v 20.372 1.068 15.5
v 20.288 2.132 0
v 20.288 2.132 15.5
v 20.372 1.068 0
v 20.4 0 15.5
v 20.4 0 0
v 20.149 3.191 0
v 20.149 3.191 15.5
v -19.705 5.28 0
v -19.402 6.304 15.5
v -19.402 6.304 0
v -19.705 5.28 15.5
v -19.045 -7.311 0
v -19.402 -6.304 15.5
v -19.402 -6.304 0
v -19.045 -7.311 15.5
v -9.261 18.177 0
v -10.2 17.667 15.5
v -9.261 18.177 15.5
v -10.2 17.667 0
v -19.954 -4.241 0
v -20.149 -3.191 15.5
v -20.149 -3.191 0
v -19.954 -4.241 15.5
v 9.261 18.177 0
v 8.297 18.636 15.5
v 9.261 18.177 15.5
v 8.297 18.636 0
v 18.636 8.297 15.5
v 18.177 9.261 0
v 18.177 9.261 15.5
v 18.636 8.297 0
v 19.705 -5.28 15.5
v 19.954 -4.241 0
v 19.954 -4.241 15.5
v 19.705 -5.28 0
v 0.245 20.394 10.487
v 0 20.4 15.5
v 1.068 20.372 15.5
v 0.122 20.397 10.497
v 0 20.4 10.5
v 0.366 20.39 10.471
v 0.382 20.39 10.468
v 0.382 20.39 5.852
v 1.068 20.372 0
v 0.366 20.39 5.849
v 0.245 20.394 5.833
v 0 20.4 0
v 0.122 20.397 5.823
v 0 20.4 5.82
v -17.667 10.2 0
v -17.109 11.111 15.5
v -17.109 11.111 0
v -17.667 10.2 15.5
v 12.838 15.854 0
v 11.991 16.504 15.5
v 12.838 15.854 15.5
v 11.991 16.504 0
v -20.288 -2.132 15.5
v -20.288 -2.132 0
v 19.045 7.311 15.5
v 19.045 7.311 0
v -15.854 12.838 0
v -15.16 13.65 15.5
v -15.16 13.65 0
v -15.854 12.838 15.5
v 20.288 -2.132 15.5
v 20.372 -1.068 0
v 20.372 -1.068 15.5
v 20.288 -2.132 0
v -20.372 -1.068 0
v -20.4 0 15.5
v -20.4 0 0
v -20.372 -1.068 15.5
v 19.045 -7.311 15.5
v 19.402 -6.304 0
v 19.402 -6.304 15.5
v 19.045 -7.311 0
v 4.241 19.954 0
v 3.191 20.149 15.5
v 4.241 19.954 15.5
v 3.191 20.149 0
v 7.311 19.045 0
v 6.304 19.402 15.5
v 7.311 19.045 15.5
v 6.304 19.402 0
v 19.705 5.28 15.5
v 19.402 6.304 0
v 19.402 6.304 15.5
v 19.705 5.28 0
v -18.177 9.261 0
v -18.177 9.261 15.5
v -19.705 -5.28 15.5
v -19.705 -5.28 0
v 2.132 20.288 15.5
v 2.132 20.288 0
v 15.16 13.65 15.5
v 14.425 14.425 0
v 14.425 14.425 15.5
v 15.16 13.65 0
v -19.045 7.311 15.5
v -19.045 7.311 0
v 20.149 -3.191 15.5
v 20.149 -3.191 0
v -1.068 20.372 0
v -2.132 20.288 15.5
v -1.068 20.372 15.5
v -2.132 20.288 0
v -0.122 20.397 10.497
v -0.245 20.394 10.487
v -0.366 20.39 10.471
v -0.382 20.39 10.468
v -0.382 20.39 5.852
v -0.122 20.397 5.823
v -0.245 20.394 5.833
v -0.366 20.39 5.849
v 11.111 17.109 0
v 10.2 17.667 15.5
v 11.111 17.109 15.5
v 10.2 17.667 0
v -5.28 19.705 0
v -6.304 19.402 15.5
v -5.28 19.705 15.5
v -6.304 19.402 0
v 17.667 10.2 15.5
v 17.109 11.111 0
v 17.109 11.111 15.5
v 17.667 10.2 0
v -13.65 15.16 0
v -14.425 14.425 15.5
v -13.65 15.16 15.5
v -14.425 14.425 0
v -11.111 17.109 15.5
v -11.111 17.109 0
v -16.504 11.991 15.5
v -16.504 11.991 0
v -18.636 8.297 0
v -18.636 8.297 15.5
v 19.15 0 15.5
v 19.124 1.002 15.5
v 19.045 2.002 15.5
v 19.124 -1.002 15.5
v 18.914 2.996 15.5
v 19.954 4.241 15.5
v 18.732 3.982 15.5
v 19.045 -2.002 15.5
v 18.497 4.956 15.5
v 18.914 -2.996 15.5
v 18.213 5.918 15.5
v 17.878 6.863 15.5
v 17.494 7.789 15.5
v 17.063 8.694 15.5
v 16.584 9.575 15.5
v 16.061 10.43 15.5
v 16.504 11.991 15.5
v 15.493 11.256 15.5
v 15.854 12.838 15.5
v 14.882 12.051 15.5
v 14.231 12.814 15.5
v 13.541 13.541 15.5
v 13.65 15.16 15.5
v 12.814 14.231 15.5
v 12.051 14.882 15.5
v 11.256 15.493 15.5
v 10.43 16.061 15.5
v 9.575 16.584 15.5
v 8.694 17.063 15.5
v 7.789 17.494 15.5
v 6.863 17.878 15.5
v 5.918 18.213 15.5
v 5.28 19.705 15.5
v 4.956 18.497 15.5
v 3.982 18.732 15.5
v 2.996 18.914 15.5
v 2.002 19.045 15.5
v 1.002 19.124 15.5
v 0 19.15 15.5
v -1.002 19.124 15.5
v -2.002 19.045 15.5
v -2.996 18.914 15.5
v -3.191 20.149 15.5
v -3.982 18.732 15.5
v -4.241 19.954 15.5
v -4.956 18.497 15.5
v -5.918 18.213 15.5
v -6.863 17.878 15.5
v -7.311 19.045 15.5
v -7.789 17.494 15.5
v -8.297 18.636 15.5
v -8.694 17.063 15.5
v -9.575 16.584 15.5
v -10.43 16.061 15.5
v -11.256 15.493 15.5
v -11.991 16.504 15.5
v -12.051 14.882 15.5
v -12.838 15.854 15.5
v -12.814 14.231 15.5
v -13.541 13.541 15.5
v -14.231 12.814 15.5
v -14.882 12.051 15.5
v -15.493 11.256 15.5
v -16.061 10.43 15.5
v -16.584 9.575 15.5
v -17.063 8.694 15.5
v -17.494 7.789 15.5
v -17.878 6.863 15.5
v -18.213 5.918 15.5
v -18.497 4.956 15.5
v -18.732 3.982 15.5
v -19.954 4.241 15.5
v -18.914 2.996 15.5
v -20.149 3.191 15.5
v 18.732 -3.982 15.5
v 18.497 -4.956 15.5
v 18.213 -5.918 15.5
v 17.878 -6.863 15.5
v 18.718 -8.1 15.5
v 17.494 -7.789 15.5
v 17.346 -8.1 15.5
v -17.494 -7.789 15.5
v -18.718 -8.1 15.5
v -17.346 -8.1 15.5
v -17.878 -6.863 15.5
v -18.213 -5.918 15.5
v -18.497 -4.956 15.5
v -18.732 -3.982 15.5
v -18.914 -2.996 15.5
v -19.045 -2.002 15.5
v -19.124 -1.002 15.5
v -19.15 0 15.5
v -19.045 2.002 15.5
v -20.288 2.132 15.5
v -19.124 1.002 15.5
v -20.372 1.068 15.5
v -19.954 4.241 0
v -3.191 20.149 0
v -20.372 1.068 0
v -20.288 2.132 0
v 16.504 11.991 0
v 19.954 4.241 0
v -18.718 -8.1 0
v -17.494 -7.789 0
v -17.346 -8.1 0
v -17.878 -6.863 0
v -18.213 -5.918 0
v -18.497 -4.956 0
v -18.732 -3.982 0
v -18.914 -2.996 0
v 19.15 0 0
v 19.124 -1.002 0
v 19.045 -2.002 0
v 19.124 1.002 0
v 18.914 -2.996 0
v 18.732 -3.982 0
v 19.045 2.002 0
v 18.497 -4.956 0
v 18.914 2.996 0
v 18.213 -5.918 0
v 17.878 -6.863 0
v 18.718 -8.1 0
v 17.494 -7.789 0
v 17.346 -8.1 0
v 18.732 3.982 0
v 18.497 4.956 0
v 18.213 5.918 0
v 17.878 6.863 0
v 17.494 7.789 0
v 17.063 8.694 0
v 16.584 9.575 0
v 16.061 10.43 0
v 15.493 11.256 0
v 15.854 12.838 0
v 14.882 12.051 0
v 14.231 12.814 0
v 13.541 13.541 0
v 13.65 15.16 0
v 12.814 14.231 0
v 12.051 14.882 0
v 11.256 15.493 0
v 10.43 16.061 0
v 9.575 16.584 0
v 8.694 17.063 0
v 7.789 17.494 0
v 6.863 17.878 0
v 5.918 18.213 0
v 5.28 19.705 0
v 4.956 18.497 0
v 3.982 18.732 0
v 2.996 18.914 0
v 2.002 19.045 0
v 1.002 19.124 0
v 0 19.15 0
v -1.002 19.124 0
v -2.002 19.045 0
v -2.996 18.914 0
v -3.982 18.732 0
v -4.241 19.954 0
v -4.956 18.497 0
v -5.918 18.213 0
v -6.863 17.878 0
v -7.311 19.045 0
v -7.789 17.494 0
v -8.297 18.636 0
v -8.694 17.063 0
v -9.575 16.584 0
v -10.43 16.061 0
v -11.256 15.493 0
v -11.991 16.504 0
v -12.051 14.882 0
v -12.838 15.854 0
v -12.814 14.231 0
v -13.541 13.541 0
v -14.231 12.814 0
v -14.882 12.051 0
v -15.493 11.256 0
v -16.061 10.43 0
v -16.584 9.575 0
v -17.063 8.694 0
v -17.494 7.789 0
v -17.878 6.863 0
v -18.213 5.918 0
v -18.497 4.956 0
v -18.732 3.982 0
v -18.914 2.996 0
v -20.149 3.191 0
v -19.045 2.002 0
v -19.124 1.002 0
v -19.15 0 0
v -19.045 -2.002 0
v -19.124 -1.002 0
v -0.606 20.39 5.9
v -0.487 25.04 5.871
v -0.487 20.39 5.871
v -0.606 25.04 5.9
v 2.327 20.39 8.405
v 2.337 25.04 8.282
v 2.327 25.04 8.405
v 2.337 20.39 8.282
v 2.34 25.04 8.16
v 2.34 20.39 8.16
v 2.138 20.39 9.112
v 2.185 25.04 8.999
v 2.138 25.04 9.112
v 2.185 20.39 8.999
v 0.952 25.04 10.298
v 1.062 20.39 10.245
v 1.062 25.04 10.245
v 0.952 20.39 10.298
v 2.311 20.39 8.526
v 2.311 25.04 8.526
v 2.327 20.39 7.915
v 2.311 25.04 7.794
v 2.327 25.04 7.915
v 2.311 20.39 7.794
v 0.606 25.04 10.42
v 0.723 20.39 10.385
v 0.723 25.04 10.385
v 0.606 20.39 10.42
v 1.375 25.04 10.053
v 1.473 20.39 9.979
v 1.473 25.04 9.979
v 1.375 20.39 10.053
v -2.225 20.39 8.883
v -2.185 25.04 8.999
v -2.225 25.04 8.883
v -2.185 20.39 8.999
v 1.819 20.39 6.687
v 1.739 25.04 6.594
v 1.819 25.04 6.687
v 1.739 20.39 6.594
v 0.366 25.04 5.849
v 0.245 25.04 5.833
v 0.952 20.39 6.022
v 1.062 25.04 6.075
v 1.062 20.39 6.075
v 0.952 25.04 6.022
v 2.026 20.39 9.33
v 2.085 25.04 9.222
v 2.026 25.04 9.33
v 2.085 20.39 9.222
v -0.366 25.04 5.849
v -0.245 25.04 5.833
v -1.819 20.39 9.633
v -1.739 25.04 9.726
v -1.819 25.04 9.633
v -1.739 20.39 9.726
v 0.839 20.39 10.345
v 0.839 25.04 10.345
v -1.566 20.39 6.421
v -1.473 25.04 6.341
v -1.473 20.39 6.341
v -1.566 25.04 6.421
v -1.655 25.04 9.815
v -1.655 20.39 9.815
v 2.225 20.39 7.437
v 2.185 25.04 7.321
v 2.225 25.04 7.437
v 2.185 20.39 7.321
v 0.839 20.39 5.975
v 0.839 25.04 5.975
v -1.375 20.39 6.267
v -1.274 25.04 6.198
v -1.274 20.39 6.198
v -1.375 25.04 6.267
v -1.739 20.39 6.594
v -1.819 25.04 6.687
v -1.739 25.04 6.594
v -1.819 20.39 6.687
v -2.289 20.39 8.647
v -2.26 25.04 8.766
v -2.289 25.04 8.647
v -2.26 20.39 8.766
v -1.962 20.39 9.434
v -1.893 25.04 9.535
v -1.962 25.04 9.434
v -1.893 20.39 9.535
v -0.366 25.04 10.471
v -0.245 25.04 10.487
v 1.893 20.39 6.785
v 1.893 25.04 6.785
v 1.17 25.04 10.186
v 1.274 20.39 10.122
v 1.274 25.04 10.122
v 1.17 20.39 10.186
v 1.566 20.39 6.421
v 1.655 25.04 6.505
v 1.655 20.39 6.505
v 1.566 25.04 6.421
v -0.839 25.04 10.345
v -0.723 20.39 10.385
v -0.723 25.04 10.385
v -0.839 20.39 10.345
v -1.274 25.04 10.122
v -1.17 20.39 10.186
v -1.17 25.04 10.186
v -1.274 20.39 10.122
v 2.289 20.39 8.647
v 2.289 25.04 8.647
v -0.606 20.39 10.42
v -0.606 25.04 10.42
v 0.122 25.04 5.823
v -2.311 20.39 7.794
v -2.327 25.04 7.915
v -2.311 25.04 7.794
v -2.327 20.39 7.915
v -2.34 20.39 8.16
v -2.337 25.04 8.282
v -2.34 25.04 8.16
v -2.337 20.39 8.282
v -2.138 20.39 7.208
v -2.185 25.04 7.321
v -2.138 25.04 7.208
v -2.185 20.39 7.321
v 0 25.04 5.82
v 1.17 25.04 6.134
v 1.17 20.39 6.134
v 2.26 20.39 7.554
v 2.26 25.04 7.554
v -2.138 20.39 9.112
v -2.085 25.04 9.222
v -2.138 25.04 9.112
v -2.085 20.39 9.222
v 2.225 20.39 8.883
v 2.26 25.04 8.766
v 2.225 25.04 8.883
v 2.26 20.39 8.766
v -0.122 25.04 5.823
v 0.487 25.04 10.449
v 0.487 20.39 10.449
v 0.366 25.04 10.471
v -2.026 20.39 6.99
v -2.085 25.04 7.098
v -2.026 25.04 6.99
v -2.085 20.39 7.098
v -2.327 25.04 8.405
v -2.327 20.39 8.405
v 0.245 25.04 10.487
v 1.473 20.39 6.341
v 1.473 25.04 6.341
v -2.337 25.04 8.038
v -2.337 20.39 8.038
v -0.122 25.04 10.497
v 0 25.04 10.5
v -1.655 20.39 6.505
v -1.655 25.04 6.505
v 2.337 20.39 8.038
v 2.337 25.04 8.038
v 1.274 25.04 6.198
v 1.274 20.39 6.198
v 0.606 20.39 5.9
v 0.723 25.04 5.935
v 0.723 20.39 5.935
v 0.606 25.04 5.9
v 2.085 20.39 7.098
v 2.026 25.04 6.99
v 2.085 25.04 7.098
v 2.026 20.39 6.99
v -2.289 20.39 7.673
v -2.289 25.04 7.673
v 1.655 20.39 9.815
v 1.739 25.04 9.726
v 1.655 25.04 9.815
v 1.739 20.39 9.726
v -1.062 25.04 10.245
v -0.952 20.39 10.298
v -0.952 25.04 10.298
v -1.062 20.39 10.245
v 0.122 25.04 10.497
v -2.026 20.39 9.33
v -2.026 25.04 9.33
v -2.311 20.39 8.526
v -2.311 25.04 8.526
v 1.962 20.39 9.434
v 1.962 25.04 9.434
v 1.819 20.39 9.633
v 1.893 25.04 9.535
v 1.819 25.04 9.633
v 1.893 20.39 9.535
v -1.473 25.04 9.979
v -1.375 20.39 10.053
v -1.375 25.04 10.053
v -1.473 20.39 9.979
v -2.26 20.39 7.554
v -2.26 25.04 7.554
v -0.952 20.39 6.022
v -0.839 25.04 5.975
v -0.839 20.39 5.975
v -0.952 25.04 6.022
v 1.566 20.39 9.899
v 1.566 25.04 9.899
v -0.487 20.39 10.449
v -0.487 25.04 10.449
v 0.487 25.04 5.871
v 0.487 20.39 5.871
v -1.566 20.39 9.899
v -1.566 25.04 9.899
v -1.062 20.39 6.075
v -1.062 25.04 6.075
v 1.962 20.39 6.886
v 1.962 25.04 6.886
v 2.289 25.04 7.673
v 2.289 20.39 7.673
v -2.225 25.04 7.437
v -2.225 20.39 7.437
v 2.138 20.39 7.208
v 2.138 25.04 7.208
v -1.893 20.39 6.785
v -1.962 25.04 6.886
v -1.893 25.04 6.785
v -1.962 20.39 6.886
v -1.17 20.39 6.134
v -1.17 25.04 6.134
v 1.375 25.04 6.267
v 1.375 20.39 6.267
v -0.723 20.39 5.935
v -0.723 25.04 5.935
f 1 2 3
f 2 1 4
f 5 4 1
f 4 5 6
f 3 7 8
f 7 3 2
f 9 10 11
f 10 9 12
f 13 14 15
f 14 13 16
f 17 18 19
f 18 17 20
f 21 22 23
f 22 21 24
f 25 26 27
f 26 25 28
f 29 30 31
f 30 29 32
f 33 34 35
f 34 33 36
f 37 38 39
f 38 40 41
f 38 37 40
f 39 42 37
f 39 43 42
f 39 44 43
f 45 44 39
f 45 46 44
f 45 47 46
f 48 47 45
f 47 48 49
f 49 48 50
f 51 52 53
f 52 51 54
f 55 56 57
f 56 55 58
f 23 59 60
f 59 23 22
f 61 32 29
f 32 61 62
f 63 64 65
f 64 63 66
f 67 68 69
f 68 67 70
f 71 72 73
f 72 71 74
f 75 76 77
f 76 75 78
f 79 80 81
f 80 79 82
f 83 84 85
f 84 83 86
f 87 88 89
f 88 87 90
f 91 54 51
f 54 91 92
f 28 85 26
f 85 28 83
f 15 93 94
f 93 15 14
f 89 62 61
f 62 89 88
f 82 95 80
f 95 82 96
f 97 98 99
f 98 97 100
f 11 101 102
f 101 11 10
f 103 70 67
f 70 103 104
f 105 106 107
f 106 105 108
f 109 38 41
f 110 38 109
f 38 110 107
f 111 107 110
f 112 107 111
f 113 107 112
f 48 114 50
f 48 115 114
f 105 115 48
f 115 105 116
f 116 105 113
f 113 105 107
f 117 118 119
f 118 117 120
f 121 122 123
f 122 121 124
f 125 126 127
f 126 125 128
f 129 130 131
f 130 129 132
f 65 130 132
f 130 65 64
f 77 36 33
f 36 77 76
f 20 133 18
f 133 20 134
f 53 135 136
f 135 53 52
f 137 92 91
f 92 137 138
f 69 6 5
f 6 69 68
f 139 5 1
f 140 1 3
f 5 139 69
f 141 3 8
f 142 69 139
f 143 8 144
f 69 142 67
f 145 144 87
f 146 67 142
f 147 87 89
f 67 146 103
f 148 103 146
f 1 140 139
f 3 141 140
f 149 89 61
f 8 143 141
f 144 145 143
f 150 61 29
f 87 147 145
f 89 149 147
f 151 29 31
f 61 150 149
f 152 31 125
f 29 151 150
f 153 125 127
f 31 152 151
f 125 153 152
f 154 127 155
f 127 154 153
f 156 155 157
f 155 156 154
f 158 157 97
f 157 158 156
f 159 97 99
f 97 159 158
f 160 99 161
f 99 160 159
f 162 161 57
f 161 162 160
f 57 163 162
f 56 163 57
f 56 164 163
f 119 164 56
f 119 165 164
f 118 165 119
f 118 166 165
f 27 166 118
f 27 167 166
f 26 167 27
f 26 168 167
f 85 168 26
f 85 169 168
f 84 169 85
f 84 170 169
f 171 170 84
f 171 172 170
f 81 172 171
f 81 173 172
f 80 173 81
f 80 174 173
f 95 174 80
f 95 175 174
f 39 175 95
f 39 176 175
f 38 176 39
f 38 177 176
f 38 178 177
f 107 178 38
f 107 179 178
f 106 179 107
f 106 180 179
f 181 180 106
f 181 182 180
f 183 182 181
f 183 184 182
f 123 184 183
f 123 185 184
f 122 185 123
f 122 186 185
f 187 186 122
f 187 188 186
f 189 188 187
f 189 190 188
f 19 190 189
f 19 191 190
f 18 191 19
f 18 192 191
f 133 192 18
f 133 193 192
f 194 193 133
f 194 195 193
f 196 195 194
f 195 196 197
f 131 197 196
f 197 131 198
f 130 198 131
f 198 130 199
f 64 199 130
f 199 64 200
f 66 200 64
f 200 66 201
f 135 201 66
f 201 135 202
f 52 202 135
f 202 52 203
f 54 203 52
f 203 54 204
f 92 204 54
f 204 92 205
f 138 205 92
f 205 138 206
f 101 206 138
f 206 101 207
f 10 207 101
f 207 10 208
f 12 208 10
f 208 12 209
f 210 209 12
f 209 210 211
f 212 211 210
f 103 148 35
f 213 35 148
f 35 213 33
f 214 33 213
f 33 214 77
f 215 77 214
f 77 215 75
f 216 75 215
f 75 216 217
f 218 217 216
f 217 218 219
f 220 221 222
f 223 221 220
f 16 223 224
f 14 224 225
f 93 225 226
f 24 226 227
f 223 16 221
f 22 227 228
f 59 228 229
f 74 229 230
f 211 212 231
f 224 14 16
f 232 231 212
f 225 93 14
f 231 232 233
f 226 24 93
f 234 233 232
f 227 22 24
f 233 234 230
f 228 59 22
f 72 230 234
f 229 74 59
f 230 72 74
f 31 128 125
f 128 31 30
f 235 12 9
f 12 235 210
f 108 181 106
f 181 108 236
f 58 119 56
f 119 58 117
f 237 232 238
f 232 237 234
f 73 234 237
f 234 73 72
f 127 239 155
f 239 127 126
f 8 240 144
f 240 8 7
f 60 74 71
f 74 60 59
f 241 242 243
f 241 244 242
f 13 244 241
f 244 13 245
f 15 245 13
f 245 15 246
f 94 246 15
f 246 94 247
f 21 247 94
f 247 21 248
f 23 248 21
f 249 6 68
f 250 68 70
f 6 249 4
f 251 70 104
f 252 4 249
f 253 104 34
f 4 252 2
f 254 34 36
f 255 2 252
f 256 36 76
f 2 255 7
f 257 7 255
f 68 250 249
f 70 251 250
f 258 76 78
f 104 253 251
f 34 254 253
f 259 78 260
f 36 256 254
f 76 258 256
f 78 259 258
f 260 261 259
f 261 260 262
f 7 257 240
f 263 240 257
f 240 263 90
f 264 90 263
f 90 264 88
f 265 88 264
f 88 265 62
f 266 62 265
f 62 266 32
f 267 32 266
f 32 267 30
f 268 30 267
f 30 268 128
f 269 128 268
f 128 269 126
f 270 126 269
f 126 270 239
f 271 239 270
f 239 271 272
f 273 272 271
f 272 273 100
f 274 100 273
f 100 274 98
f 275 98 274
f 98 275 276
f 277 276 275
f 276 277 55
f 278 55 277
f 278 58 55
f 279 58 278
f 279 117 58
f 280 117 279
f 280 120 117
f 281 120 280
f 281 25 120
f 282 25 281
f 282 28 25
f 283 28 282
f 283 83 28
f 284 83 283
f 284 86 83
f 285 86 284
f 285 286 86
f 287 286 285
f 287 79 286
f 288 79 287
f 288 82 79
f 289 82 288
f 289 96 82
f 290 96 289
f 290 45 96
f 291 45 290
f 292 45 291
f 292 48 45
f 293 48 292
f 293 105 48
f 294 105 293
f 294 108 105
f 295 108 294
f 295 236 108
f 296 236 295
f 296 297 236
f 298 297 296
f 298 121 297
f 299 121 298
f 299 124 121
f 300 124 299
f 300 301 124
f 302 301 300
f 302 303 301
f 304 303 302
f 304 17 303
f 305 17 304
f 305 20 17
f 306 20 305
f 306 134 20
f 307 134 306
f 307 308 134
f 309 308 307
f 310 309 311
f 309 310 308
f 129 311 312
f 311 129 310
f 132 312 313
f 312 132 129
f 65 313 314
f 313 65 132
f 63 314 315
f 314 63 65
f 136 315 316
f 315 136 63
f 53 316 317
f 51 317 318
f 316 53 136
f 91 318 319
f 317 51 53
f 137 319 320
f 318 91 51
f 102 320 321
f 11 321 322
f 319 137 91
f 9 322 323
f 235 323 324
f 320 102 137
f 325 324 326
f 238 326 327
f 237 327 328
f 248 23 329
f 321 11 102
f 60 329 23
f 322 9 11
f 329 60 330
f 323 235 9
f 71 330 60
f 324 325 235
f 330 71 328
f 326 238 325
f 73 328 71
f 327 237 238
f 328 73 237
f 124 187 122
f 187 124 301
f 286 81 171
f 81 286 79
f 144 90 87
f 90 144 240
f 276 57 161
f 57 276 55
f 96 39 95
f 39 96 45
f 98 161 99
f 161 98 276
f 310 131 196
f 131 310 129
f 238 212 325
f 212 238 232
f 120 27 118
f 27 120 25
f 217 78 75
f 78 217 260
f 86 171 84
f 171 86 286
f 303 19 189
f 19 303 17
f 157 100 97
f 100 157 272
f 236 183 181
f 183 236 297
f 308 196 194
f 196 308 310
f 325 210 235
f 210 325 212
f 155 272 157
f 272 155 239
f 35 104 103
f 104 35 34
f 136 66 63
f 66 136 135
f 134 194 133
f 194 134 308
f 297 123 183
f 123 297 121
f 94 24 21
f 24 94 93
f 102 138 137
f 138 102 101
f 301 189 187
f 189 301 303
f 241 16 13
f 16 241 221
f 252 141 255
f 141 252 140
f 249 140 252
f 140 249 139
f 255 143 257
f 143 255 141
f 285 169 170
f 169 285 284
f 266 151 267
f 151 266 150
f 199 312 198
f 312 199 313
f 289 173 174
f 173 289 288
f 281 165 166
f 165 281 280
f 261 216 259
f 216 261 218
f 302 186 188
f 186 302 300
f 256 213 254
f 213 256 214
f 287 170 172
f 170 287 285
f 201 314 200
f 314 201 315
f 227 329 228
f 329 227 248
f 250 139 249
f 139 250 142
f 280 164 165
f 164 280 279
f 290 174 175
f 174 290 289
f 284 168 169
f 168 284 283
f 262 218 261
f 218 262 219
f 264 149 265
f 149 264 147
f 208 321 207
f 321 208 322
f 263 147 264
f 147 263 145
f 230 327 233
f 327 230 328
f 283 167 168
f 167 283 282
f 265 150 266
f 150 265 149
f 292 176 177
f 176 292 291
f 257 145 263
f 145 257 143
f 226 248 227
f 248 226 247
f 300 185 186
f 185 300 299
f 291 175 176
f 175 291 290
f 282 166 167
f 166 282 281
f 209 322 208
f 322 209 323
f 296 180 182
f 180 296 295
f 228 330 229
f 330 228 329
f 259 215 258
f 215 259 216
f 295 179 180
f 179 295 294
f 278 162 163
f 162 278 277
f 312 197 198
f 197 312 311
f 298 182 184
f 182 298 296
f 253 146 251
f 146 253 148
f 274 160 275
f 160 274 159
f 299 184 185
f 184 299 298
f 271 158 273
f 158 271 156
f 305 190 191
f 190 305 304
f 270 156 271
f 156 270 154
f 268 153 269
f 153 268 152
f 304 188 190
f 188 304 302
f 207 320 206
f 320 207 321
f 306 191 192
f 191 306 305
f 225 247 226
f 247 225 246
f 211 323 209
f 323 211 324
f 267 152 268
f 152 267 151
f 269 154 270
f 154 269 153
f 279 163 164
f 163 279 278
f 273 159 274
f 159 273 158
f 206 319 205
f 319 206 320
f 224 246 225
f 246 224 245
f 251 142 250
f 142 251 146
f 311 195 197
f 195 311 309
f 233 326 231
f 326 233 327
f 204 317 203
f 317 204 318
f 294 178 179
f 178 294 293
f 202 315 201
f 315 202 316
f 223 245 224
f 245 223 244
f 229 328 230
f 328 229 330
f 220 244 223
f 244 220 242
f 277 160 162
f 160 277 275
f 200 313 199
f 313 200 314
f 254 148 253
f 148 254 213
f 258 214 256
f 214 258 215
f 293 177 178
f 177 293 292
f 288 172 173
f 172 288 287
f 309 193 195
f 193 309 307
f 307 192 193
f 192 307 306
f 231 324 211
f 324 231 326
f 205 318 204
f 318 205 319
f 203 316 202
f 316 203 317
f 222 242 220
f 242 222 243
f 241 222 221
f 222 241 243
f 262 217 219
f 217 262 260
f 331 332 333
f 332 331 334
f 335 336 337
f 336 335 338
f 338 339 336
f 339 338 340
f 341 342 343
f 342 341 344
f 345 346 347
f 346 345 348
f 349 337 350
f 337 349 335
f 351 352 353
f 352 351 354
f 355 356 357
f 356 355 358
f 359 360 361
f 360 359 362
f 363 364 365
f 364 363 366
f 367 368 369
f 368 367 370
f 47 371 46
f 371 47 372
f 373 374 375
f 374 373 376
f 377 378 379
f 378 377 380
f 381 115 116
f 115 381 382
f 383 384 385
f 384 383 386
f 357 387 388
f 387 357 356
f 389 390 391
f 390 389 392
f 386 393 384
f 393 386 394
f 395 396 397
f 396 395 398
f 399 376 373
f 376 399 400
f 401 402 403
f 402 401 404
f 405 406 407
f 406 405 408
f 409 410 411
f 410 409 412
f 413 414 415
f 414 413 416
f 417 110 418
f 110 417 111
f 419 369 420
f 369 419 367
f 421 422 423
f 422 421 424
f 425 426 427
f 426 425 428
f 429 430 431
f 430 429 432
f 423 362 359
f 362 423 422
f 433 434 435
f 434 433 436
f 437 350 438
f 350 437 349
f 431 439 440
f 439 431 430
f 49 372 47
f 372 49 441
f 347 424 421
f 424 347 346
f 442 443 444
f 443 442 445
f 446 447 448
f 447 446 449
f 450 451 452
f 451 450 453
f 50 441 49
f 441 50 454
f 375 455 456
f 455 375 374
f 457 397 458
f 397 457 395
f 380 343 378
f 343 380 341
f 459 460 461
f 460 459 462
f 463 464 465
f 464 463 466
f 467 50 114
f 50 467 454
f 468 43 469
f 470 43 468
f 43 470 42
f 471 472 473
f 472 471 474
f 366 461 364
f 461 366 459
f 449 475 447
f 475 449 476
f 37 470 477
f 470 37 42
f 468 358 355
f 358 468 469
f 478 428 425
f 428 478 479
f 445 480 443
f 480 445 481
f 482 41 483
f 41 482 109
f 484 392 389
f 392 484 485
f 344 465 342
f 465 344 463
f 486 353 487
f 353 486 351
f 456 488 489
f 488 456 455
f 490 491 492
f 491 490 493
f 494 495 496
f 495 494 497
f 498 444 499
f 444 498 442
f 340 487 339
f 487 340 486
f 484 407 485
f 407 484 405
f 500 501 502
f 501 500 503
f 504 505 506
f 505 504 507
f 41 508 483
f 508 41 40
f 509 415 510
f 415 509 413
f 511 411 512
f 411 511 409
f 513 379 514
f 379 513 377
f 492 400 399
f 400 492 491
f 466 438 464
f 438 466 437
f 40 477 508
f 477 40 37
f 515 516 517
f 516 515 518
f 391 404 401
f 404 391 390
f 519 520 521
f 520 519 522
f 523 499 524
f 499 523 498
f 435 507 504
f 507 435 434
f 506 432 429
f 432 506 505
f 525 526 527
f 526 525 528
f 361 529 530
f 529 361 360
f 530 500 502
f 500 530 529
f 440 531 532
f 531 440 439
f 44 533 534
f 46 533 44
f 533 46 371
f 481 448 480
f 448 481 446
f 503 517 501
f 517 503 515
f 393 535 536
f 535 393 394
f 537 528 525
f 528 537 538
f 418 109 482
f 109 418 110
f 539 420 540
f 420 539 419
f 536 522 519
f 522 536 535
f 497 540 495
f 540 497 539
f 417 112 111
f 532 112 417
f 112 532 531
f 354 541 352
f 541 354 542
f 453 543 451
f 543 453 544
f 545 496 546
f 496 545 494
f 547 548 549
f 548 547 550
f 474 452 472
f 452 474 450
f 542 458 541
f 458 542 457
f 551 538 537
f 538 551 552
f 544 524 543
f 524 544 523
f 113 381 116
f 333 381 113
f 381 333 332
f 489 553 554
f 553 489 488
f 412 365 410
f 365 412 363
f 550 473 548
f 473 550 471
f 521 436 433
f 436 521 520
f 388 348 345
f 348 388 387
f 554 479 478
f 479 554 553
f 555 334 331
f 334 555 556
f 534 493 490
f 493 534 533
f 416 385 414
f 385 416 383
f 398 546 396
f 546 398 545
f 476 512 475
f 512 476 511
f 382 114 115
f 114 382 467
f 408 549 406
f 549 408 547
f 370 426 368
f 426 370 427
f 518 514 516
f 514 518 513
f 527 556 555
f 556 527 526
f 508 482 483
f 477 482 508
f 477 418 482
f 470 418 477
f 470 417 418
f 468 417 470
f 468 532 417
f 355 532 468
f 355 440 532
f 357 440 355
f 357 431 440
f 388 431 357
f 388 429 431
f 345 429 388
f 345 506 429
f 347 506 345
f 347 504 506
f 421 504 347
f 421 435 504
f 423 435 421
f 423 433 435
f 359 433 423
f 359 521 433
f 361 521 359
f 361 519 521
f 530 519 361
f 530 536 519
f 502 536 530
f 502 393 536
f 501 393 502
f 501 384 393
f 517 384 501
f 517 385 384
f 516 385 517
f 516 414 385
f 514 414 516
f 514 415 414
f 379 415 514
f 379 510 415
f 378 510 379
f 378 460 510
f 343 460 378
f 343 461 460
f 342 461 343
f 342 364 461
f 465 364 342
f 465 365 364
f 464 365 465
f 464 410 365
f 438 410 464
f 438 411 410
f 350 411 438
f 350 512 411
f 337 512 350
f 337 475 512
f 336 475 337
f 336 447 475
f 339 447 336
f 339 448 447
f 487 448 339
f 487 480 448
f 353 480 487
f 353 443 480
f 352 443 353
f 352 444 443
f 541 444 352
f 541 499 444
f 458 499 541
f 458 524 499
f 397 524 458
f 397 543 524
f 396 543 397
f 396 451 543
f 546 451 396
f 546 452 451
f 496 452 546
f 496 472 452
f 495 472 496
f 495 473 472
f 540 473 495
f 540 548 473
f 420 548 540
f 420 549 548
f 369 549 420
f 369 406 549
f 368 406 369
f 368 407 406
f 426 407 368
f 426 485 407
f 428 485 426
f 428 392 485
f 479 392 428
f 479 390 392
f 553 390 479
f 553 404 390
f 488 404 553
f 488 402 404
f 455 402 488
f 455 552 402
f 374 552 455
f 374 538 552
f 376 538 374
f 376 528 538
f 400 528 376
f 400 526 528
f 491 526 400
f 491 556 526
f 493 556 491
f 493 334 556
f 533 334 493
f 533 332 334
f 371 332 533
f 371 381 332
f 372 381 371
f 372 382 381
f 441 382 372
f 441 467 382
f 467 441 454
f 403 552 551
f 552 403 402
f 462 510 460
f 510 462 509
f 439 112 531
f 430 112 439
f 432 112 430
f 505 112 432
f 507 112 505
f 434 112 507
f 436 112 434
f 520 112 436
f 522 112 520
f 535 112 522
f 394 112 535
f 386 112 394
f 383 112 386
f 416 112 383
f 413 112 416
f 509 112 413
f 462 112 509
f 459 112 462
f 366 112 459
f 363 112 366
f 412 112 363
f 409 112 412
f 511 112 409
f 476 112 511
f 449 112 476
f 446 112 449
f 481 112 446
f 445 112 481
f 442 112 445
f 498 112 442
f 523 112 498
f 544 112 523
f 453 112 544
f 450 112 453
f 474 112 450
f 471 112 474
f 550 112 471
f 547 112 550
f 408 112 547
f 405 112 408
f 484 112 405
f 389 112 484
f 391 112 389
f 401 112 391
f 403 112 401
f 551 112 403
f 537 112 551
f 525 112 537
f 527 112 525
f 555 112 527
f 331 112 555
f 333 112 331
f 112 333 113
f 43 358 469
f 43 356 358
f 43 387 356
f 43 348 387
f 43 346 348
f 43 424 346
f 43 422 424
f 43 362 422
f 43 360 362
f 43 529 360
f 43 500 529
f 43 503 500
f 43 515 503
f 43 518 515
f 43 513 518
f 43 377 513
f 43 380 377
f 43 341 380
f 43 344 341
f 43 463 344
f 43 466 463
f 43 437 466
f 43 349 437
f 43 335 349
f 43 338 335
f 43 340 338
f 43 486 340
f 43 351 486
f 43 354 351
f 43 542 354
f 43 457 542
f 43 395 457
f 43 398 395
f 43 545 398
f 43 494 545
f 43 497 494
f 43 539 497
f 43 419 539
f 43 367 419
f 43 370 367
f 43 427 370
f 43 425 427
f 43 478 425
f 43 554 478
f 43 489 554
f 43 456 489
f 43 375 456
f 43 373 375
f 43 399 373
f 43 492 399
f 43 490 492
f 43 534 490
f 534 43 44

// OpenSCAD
$fn = 120;

outer_diameter = 40.8;
thickness = 2.5;
cutoff = 28.5;
height = 15.5;

difference() {
    cylinder(h = height , d = outer_diameter);
    translate([0,0,-0.01]) cylinder(h = 16.02, d = outer_diameter - thickness);
    translate([-outer_diameter/2, -outer_diameter/2-cutoff, -.01]) cube([outer_diameter, outer_diameter, height+.02]);
}

plug_diameter = 4.68;
plug_height = 4.65;

translate([0,outer_diameter/2+plug_height-.01,plug_diameter/2+5.82]) rotate([90,0,0]) cylinder(h=plug_height, d = plug_diameter);
